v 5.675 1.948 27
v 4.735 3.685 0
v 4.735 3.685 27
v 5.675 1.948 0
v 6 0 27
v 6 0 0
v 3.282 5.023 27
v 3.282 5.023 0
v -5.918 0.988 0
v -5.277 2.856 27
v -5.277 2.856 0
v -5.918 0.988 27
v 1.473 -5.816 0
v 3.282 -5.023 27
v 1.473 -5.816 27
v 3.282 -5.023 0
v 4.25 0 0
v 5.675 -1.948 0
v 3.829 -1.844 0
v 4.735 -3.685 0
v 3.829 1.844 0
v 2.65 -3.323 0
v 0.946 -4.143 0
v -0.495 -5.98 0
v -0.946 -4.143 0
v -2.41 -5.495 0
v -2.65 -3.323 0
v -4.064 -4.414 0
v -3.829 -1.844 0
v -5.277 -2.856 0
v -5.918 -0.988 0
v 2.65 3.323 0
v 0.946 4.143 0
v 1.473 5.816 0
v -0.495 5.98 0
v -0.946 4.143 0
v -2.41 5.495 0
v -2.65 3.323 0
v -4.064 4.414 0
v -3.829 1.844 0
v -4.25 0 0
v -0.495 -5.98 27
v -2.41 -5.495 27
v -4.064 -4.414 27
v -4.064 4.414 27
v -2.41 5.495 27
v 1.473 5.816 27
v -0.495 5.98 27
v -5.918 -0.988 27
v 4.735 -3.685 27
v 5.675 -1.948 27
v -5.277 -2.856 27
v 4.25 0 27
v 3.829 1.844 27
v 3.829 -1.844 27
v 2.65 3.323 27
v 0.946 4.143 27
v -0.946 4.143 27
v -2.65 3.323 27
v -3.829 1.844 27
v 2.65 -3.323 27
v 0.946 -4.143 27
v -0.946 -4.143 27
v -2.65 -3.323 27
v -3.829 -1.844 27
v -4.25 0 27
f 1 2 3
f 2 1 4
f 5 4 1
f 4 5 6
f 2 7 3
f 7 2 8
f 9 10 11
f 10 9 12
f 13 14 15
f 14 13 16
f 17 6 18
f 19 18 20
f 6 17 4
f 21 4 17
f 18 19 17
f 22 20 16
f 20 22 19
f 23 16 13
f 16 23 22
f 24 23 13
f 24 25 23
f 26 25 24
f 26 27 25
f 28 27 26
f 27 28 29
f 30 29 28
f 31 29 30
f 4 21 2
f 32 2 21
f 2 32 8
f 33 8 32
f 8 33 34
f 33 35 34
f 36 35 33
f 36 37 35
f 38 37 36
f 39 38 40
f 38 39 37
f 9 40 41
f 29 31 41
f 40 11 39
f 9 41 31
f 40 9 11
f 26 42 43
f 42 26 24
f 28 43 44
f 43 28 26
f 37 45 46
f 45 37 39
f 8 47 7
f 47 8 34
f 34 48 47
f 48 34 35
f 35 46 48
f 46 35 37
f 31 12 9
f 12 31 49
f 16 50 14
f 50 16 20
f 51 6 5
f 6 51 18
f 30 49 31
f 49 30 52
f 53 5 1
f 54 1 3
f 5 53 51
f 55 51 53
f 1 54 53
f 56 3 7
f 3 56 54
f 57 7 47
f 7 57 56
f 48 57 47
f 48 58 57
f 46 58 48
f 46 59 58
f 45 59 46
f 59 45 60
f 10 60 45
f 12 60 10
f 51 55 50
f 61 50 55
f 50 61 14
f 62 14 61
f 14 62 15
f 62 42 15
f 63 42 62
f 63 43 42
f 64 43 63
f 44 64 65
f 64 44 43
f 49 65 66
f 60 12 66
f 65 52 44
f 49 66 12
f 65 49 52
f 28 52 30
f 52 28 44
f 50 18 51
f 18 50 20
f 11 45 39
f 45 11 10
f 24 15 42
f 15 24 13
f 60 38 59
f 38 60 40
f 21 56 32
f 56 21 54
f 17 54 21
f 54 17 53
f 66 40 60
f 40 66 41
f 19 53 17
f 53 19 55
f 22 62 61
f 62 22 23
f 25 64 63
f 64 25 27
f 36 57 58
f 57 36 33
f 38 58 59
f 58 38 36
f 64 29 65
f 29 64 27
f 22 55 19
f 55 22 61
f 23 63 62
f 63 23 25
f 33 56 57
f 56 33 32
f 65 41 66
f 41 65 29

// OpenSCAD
//Make sure that the thickness of the spool wall is thinner then the combine sum of half of the number of bearings times the bearing width.

//Width in mm
Spool_width=51; // [30:200]
//Width in mm
Bearing_width=5; // [5:1:20]
//The number of bearings are split equal on each side of the spacer:
Number_of_bearings=4; // [2:2:8]
A=10*1;
B=3*1;
Spacer_width=(Spool_width+2)-(Number_of_bearings*Bearing_width)-(2*B);
//Total length of the threaded rod in mm
Rod_length=(Spacer_width);

difference()
  {
      cylinder(r=12/2, h=Spacer_width);
      translate([0,0,-1])
      cylinder(r=8.5/2, h=Spacer_width+2);
  }
